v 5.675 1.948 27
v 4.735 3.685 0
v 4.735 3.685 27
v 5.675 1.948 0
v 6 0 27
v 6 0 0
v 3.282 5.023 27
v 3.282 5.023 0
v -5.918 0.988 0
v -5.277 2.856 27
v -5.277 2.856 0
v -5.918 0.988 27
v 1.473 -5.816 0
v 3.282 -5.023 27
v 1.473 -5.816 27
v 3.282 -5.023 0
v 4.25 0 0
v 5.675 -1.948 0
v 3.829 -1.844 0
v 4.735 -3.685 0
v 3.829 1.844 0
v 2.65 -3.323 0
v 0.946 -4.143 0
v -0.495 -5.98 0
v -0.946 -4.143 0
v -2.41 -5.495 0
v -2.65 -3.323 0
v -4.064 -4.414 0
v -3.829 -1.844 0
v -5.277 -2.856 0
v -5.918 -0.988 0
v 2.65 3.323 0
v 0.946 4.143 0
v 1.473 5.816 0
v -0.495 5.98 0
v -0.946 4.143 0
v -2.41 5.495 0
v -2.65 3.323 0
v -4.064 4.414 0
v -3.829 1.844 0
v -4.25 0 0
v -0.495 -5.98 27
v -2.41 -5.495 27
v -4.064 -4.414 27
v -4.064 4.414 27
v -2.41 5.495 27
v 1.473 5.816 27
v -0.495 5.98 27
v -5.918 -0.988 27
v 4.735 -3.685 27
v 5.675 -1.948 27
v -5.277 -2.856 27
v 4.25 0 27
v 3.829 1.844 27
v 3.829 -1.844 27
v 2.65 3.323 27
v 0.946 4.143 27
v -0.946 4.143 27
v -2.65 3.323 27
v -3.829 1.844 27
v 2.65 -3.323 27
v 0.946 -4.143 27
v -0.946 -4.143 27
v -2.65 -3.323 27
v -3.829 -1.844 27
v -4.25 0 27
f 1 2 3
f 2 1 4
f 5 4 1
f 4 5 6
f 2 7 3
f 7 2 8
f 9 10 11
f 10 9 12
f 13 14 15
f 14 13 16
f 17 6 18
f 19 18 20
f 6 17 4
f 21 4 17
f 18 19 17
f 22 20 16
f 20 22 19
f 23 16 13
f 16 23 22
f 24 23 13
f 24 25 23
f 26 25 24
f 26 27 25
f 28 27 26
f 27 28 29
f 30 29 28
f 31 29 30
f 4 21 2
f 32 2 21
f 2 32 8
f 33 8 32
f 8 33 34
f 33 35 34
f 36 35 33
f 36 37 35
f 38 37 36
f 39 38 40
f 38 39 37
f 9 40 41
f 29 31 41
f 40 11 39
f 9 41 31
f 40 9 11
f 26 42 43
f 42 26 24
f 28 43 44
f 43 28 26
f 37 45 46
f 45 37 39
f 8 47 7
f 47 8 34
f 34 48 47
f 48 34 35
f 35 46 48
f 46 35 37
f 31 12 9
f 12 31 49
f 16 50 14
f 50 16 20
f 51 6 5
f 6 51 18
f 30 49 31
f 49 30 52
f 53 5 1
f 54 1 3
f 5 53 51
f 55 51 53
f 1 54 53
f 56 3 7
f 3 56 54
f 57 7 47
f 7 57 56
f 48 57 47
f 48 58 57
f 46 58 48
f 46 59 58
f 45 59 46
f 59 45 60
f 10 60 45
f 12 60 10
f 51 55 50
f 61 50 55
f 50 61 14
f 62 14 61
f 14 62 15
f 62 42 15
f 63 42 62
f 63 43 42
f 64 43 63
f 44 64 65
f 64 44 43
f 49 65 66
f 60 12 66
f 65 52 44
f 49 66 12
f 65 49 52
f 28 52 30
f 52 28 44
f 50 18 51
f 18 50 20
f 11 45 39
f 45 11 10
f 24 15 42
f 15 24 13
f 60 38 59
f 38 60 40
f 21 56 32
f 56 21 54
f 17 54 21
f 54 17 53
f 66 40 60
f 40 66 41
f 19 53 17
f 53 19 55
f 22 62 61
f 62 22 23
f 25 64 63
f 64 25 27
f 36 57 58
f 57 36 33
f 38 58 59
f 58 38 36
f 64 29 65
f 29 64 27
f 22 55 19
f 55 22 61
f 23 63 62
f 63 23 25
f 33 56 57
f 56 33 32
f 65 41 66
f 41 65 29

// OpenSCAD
//Make sure that the thickness of the spool wall is thinner then the combine sum of half of the number of bearings times the bearing width.

//Width in mm
Spool_width=51; // [30:200]
//Width in mm
Bearing_width=5; // [5:1:20]
//The number of bearings are split equal on each side of the spacer:
Number_of_bearings=4; // [2:2:8]
A=10*1;
B=3*1;
Spacer_width=(Spool_width+2)-(Number_of_bearings*Bearing_width)-(2*B);
//Total length of the threaded rod in mm
Rod_length=(Spacer_width);

difference()
  {
      cylinder(r=12/2, h=Spacer_width);
      translate([0,0,-1])
      cylinder(r=8.5/2, h=Spacer_width+2);
  }
